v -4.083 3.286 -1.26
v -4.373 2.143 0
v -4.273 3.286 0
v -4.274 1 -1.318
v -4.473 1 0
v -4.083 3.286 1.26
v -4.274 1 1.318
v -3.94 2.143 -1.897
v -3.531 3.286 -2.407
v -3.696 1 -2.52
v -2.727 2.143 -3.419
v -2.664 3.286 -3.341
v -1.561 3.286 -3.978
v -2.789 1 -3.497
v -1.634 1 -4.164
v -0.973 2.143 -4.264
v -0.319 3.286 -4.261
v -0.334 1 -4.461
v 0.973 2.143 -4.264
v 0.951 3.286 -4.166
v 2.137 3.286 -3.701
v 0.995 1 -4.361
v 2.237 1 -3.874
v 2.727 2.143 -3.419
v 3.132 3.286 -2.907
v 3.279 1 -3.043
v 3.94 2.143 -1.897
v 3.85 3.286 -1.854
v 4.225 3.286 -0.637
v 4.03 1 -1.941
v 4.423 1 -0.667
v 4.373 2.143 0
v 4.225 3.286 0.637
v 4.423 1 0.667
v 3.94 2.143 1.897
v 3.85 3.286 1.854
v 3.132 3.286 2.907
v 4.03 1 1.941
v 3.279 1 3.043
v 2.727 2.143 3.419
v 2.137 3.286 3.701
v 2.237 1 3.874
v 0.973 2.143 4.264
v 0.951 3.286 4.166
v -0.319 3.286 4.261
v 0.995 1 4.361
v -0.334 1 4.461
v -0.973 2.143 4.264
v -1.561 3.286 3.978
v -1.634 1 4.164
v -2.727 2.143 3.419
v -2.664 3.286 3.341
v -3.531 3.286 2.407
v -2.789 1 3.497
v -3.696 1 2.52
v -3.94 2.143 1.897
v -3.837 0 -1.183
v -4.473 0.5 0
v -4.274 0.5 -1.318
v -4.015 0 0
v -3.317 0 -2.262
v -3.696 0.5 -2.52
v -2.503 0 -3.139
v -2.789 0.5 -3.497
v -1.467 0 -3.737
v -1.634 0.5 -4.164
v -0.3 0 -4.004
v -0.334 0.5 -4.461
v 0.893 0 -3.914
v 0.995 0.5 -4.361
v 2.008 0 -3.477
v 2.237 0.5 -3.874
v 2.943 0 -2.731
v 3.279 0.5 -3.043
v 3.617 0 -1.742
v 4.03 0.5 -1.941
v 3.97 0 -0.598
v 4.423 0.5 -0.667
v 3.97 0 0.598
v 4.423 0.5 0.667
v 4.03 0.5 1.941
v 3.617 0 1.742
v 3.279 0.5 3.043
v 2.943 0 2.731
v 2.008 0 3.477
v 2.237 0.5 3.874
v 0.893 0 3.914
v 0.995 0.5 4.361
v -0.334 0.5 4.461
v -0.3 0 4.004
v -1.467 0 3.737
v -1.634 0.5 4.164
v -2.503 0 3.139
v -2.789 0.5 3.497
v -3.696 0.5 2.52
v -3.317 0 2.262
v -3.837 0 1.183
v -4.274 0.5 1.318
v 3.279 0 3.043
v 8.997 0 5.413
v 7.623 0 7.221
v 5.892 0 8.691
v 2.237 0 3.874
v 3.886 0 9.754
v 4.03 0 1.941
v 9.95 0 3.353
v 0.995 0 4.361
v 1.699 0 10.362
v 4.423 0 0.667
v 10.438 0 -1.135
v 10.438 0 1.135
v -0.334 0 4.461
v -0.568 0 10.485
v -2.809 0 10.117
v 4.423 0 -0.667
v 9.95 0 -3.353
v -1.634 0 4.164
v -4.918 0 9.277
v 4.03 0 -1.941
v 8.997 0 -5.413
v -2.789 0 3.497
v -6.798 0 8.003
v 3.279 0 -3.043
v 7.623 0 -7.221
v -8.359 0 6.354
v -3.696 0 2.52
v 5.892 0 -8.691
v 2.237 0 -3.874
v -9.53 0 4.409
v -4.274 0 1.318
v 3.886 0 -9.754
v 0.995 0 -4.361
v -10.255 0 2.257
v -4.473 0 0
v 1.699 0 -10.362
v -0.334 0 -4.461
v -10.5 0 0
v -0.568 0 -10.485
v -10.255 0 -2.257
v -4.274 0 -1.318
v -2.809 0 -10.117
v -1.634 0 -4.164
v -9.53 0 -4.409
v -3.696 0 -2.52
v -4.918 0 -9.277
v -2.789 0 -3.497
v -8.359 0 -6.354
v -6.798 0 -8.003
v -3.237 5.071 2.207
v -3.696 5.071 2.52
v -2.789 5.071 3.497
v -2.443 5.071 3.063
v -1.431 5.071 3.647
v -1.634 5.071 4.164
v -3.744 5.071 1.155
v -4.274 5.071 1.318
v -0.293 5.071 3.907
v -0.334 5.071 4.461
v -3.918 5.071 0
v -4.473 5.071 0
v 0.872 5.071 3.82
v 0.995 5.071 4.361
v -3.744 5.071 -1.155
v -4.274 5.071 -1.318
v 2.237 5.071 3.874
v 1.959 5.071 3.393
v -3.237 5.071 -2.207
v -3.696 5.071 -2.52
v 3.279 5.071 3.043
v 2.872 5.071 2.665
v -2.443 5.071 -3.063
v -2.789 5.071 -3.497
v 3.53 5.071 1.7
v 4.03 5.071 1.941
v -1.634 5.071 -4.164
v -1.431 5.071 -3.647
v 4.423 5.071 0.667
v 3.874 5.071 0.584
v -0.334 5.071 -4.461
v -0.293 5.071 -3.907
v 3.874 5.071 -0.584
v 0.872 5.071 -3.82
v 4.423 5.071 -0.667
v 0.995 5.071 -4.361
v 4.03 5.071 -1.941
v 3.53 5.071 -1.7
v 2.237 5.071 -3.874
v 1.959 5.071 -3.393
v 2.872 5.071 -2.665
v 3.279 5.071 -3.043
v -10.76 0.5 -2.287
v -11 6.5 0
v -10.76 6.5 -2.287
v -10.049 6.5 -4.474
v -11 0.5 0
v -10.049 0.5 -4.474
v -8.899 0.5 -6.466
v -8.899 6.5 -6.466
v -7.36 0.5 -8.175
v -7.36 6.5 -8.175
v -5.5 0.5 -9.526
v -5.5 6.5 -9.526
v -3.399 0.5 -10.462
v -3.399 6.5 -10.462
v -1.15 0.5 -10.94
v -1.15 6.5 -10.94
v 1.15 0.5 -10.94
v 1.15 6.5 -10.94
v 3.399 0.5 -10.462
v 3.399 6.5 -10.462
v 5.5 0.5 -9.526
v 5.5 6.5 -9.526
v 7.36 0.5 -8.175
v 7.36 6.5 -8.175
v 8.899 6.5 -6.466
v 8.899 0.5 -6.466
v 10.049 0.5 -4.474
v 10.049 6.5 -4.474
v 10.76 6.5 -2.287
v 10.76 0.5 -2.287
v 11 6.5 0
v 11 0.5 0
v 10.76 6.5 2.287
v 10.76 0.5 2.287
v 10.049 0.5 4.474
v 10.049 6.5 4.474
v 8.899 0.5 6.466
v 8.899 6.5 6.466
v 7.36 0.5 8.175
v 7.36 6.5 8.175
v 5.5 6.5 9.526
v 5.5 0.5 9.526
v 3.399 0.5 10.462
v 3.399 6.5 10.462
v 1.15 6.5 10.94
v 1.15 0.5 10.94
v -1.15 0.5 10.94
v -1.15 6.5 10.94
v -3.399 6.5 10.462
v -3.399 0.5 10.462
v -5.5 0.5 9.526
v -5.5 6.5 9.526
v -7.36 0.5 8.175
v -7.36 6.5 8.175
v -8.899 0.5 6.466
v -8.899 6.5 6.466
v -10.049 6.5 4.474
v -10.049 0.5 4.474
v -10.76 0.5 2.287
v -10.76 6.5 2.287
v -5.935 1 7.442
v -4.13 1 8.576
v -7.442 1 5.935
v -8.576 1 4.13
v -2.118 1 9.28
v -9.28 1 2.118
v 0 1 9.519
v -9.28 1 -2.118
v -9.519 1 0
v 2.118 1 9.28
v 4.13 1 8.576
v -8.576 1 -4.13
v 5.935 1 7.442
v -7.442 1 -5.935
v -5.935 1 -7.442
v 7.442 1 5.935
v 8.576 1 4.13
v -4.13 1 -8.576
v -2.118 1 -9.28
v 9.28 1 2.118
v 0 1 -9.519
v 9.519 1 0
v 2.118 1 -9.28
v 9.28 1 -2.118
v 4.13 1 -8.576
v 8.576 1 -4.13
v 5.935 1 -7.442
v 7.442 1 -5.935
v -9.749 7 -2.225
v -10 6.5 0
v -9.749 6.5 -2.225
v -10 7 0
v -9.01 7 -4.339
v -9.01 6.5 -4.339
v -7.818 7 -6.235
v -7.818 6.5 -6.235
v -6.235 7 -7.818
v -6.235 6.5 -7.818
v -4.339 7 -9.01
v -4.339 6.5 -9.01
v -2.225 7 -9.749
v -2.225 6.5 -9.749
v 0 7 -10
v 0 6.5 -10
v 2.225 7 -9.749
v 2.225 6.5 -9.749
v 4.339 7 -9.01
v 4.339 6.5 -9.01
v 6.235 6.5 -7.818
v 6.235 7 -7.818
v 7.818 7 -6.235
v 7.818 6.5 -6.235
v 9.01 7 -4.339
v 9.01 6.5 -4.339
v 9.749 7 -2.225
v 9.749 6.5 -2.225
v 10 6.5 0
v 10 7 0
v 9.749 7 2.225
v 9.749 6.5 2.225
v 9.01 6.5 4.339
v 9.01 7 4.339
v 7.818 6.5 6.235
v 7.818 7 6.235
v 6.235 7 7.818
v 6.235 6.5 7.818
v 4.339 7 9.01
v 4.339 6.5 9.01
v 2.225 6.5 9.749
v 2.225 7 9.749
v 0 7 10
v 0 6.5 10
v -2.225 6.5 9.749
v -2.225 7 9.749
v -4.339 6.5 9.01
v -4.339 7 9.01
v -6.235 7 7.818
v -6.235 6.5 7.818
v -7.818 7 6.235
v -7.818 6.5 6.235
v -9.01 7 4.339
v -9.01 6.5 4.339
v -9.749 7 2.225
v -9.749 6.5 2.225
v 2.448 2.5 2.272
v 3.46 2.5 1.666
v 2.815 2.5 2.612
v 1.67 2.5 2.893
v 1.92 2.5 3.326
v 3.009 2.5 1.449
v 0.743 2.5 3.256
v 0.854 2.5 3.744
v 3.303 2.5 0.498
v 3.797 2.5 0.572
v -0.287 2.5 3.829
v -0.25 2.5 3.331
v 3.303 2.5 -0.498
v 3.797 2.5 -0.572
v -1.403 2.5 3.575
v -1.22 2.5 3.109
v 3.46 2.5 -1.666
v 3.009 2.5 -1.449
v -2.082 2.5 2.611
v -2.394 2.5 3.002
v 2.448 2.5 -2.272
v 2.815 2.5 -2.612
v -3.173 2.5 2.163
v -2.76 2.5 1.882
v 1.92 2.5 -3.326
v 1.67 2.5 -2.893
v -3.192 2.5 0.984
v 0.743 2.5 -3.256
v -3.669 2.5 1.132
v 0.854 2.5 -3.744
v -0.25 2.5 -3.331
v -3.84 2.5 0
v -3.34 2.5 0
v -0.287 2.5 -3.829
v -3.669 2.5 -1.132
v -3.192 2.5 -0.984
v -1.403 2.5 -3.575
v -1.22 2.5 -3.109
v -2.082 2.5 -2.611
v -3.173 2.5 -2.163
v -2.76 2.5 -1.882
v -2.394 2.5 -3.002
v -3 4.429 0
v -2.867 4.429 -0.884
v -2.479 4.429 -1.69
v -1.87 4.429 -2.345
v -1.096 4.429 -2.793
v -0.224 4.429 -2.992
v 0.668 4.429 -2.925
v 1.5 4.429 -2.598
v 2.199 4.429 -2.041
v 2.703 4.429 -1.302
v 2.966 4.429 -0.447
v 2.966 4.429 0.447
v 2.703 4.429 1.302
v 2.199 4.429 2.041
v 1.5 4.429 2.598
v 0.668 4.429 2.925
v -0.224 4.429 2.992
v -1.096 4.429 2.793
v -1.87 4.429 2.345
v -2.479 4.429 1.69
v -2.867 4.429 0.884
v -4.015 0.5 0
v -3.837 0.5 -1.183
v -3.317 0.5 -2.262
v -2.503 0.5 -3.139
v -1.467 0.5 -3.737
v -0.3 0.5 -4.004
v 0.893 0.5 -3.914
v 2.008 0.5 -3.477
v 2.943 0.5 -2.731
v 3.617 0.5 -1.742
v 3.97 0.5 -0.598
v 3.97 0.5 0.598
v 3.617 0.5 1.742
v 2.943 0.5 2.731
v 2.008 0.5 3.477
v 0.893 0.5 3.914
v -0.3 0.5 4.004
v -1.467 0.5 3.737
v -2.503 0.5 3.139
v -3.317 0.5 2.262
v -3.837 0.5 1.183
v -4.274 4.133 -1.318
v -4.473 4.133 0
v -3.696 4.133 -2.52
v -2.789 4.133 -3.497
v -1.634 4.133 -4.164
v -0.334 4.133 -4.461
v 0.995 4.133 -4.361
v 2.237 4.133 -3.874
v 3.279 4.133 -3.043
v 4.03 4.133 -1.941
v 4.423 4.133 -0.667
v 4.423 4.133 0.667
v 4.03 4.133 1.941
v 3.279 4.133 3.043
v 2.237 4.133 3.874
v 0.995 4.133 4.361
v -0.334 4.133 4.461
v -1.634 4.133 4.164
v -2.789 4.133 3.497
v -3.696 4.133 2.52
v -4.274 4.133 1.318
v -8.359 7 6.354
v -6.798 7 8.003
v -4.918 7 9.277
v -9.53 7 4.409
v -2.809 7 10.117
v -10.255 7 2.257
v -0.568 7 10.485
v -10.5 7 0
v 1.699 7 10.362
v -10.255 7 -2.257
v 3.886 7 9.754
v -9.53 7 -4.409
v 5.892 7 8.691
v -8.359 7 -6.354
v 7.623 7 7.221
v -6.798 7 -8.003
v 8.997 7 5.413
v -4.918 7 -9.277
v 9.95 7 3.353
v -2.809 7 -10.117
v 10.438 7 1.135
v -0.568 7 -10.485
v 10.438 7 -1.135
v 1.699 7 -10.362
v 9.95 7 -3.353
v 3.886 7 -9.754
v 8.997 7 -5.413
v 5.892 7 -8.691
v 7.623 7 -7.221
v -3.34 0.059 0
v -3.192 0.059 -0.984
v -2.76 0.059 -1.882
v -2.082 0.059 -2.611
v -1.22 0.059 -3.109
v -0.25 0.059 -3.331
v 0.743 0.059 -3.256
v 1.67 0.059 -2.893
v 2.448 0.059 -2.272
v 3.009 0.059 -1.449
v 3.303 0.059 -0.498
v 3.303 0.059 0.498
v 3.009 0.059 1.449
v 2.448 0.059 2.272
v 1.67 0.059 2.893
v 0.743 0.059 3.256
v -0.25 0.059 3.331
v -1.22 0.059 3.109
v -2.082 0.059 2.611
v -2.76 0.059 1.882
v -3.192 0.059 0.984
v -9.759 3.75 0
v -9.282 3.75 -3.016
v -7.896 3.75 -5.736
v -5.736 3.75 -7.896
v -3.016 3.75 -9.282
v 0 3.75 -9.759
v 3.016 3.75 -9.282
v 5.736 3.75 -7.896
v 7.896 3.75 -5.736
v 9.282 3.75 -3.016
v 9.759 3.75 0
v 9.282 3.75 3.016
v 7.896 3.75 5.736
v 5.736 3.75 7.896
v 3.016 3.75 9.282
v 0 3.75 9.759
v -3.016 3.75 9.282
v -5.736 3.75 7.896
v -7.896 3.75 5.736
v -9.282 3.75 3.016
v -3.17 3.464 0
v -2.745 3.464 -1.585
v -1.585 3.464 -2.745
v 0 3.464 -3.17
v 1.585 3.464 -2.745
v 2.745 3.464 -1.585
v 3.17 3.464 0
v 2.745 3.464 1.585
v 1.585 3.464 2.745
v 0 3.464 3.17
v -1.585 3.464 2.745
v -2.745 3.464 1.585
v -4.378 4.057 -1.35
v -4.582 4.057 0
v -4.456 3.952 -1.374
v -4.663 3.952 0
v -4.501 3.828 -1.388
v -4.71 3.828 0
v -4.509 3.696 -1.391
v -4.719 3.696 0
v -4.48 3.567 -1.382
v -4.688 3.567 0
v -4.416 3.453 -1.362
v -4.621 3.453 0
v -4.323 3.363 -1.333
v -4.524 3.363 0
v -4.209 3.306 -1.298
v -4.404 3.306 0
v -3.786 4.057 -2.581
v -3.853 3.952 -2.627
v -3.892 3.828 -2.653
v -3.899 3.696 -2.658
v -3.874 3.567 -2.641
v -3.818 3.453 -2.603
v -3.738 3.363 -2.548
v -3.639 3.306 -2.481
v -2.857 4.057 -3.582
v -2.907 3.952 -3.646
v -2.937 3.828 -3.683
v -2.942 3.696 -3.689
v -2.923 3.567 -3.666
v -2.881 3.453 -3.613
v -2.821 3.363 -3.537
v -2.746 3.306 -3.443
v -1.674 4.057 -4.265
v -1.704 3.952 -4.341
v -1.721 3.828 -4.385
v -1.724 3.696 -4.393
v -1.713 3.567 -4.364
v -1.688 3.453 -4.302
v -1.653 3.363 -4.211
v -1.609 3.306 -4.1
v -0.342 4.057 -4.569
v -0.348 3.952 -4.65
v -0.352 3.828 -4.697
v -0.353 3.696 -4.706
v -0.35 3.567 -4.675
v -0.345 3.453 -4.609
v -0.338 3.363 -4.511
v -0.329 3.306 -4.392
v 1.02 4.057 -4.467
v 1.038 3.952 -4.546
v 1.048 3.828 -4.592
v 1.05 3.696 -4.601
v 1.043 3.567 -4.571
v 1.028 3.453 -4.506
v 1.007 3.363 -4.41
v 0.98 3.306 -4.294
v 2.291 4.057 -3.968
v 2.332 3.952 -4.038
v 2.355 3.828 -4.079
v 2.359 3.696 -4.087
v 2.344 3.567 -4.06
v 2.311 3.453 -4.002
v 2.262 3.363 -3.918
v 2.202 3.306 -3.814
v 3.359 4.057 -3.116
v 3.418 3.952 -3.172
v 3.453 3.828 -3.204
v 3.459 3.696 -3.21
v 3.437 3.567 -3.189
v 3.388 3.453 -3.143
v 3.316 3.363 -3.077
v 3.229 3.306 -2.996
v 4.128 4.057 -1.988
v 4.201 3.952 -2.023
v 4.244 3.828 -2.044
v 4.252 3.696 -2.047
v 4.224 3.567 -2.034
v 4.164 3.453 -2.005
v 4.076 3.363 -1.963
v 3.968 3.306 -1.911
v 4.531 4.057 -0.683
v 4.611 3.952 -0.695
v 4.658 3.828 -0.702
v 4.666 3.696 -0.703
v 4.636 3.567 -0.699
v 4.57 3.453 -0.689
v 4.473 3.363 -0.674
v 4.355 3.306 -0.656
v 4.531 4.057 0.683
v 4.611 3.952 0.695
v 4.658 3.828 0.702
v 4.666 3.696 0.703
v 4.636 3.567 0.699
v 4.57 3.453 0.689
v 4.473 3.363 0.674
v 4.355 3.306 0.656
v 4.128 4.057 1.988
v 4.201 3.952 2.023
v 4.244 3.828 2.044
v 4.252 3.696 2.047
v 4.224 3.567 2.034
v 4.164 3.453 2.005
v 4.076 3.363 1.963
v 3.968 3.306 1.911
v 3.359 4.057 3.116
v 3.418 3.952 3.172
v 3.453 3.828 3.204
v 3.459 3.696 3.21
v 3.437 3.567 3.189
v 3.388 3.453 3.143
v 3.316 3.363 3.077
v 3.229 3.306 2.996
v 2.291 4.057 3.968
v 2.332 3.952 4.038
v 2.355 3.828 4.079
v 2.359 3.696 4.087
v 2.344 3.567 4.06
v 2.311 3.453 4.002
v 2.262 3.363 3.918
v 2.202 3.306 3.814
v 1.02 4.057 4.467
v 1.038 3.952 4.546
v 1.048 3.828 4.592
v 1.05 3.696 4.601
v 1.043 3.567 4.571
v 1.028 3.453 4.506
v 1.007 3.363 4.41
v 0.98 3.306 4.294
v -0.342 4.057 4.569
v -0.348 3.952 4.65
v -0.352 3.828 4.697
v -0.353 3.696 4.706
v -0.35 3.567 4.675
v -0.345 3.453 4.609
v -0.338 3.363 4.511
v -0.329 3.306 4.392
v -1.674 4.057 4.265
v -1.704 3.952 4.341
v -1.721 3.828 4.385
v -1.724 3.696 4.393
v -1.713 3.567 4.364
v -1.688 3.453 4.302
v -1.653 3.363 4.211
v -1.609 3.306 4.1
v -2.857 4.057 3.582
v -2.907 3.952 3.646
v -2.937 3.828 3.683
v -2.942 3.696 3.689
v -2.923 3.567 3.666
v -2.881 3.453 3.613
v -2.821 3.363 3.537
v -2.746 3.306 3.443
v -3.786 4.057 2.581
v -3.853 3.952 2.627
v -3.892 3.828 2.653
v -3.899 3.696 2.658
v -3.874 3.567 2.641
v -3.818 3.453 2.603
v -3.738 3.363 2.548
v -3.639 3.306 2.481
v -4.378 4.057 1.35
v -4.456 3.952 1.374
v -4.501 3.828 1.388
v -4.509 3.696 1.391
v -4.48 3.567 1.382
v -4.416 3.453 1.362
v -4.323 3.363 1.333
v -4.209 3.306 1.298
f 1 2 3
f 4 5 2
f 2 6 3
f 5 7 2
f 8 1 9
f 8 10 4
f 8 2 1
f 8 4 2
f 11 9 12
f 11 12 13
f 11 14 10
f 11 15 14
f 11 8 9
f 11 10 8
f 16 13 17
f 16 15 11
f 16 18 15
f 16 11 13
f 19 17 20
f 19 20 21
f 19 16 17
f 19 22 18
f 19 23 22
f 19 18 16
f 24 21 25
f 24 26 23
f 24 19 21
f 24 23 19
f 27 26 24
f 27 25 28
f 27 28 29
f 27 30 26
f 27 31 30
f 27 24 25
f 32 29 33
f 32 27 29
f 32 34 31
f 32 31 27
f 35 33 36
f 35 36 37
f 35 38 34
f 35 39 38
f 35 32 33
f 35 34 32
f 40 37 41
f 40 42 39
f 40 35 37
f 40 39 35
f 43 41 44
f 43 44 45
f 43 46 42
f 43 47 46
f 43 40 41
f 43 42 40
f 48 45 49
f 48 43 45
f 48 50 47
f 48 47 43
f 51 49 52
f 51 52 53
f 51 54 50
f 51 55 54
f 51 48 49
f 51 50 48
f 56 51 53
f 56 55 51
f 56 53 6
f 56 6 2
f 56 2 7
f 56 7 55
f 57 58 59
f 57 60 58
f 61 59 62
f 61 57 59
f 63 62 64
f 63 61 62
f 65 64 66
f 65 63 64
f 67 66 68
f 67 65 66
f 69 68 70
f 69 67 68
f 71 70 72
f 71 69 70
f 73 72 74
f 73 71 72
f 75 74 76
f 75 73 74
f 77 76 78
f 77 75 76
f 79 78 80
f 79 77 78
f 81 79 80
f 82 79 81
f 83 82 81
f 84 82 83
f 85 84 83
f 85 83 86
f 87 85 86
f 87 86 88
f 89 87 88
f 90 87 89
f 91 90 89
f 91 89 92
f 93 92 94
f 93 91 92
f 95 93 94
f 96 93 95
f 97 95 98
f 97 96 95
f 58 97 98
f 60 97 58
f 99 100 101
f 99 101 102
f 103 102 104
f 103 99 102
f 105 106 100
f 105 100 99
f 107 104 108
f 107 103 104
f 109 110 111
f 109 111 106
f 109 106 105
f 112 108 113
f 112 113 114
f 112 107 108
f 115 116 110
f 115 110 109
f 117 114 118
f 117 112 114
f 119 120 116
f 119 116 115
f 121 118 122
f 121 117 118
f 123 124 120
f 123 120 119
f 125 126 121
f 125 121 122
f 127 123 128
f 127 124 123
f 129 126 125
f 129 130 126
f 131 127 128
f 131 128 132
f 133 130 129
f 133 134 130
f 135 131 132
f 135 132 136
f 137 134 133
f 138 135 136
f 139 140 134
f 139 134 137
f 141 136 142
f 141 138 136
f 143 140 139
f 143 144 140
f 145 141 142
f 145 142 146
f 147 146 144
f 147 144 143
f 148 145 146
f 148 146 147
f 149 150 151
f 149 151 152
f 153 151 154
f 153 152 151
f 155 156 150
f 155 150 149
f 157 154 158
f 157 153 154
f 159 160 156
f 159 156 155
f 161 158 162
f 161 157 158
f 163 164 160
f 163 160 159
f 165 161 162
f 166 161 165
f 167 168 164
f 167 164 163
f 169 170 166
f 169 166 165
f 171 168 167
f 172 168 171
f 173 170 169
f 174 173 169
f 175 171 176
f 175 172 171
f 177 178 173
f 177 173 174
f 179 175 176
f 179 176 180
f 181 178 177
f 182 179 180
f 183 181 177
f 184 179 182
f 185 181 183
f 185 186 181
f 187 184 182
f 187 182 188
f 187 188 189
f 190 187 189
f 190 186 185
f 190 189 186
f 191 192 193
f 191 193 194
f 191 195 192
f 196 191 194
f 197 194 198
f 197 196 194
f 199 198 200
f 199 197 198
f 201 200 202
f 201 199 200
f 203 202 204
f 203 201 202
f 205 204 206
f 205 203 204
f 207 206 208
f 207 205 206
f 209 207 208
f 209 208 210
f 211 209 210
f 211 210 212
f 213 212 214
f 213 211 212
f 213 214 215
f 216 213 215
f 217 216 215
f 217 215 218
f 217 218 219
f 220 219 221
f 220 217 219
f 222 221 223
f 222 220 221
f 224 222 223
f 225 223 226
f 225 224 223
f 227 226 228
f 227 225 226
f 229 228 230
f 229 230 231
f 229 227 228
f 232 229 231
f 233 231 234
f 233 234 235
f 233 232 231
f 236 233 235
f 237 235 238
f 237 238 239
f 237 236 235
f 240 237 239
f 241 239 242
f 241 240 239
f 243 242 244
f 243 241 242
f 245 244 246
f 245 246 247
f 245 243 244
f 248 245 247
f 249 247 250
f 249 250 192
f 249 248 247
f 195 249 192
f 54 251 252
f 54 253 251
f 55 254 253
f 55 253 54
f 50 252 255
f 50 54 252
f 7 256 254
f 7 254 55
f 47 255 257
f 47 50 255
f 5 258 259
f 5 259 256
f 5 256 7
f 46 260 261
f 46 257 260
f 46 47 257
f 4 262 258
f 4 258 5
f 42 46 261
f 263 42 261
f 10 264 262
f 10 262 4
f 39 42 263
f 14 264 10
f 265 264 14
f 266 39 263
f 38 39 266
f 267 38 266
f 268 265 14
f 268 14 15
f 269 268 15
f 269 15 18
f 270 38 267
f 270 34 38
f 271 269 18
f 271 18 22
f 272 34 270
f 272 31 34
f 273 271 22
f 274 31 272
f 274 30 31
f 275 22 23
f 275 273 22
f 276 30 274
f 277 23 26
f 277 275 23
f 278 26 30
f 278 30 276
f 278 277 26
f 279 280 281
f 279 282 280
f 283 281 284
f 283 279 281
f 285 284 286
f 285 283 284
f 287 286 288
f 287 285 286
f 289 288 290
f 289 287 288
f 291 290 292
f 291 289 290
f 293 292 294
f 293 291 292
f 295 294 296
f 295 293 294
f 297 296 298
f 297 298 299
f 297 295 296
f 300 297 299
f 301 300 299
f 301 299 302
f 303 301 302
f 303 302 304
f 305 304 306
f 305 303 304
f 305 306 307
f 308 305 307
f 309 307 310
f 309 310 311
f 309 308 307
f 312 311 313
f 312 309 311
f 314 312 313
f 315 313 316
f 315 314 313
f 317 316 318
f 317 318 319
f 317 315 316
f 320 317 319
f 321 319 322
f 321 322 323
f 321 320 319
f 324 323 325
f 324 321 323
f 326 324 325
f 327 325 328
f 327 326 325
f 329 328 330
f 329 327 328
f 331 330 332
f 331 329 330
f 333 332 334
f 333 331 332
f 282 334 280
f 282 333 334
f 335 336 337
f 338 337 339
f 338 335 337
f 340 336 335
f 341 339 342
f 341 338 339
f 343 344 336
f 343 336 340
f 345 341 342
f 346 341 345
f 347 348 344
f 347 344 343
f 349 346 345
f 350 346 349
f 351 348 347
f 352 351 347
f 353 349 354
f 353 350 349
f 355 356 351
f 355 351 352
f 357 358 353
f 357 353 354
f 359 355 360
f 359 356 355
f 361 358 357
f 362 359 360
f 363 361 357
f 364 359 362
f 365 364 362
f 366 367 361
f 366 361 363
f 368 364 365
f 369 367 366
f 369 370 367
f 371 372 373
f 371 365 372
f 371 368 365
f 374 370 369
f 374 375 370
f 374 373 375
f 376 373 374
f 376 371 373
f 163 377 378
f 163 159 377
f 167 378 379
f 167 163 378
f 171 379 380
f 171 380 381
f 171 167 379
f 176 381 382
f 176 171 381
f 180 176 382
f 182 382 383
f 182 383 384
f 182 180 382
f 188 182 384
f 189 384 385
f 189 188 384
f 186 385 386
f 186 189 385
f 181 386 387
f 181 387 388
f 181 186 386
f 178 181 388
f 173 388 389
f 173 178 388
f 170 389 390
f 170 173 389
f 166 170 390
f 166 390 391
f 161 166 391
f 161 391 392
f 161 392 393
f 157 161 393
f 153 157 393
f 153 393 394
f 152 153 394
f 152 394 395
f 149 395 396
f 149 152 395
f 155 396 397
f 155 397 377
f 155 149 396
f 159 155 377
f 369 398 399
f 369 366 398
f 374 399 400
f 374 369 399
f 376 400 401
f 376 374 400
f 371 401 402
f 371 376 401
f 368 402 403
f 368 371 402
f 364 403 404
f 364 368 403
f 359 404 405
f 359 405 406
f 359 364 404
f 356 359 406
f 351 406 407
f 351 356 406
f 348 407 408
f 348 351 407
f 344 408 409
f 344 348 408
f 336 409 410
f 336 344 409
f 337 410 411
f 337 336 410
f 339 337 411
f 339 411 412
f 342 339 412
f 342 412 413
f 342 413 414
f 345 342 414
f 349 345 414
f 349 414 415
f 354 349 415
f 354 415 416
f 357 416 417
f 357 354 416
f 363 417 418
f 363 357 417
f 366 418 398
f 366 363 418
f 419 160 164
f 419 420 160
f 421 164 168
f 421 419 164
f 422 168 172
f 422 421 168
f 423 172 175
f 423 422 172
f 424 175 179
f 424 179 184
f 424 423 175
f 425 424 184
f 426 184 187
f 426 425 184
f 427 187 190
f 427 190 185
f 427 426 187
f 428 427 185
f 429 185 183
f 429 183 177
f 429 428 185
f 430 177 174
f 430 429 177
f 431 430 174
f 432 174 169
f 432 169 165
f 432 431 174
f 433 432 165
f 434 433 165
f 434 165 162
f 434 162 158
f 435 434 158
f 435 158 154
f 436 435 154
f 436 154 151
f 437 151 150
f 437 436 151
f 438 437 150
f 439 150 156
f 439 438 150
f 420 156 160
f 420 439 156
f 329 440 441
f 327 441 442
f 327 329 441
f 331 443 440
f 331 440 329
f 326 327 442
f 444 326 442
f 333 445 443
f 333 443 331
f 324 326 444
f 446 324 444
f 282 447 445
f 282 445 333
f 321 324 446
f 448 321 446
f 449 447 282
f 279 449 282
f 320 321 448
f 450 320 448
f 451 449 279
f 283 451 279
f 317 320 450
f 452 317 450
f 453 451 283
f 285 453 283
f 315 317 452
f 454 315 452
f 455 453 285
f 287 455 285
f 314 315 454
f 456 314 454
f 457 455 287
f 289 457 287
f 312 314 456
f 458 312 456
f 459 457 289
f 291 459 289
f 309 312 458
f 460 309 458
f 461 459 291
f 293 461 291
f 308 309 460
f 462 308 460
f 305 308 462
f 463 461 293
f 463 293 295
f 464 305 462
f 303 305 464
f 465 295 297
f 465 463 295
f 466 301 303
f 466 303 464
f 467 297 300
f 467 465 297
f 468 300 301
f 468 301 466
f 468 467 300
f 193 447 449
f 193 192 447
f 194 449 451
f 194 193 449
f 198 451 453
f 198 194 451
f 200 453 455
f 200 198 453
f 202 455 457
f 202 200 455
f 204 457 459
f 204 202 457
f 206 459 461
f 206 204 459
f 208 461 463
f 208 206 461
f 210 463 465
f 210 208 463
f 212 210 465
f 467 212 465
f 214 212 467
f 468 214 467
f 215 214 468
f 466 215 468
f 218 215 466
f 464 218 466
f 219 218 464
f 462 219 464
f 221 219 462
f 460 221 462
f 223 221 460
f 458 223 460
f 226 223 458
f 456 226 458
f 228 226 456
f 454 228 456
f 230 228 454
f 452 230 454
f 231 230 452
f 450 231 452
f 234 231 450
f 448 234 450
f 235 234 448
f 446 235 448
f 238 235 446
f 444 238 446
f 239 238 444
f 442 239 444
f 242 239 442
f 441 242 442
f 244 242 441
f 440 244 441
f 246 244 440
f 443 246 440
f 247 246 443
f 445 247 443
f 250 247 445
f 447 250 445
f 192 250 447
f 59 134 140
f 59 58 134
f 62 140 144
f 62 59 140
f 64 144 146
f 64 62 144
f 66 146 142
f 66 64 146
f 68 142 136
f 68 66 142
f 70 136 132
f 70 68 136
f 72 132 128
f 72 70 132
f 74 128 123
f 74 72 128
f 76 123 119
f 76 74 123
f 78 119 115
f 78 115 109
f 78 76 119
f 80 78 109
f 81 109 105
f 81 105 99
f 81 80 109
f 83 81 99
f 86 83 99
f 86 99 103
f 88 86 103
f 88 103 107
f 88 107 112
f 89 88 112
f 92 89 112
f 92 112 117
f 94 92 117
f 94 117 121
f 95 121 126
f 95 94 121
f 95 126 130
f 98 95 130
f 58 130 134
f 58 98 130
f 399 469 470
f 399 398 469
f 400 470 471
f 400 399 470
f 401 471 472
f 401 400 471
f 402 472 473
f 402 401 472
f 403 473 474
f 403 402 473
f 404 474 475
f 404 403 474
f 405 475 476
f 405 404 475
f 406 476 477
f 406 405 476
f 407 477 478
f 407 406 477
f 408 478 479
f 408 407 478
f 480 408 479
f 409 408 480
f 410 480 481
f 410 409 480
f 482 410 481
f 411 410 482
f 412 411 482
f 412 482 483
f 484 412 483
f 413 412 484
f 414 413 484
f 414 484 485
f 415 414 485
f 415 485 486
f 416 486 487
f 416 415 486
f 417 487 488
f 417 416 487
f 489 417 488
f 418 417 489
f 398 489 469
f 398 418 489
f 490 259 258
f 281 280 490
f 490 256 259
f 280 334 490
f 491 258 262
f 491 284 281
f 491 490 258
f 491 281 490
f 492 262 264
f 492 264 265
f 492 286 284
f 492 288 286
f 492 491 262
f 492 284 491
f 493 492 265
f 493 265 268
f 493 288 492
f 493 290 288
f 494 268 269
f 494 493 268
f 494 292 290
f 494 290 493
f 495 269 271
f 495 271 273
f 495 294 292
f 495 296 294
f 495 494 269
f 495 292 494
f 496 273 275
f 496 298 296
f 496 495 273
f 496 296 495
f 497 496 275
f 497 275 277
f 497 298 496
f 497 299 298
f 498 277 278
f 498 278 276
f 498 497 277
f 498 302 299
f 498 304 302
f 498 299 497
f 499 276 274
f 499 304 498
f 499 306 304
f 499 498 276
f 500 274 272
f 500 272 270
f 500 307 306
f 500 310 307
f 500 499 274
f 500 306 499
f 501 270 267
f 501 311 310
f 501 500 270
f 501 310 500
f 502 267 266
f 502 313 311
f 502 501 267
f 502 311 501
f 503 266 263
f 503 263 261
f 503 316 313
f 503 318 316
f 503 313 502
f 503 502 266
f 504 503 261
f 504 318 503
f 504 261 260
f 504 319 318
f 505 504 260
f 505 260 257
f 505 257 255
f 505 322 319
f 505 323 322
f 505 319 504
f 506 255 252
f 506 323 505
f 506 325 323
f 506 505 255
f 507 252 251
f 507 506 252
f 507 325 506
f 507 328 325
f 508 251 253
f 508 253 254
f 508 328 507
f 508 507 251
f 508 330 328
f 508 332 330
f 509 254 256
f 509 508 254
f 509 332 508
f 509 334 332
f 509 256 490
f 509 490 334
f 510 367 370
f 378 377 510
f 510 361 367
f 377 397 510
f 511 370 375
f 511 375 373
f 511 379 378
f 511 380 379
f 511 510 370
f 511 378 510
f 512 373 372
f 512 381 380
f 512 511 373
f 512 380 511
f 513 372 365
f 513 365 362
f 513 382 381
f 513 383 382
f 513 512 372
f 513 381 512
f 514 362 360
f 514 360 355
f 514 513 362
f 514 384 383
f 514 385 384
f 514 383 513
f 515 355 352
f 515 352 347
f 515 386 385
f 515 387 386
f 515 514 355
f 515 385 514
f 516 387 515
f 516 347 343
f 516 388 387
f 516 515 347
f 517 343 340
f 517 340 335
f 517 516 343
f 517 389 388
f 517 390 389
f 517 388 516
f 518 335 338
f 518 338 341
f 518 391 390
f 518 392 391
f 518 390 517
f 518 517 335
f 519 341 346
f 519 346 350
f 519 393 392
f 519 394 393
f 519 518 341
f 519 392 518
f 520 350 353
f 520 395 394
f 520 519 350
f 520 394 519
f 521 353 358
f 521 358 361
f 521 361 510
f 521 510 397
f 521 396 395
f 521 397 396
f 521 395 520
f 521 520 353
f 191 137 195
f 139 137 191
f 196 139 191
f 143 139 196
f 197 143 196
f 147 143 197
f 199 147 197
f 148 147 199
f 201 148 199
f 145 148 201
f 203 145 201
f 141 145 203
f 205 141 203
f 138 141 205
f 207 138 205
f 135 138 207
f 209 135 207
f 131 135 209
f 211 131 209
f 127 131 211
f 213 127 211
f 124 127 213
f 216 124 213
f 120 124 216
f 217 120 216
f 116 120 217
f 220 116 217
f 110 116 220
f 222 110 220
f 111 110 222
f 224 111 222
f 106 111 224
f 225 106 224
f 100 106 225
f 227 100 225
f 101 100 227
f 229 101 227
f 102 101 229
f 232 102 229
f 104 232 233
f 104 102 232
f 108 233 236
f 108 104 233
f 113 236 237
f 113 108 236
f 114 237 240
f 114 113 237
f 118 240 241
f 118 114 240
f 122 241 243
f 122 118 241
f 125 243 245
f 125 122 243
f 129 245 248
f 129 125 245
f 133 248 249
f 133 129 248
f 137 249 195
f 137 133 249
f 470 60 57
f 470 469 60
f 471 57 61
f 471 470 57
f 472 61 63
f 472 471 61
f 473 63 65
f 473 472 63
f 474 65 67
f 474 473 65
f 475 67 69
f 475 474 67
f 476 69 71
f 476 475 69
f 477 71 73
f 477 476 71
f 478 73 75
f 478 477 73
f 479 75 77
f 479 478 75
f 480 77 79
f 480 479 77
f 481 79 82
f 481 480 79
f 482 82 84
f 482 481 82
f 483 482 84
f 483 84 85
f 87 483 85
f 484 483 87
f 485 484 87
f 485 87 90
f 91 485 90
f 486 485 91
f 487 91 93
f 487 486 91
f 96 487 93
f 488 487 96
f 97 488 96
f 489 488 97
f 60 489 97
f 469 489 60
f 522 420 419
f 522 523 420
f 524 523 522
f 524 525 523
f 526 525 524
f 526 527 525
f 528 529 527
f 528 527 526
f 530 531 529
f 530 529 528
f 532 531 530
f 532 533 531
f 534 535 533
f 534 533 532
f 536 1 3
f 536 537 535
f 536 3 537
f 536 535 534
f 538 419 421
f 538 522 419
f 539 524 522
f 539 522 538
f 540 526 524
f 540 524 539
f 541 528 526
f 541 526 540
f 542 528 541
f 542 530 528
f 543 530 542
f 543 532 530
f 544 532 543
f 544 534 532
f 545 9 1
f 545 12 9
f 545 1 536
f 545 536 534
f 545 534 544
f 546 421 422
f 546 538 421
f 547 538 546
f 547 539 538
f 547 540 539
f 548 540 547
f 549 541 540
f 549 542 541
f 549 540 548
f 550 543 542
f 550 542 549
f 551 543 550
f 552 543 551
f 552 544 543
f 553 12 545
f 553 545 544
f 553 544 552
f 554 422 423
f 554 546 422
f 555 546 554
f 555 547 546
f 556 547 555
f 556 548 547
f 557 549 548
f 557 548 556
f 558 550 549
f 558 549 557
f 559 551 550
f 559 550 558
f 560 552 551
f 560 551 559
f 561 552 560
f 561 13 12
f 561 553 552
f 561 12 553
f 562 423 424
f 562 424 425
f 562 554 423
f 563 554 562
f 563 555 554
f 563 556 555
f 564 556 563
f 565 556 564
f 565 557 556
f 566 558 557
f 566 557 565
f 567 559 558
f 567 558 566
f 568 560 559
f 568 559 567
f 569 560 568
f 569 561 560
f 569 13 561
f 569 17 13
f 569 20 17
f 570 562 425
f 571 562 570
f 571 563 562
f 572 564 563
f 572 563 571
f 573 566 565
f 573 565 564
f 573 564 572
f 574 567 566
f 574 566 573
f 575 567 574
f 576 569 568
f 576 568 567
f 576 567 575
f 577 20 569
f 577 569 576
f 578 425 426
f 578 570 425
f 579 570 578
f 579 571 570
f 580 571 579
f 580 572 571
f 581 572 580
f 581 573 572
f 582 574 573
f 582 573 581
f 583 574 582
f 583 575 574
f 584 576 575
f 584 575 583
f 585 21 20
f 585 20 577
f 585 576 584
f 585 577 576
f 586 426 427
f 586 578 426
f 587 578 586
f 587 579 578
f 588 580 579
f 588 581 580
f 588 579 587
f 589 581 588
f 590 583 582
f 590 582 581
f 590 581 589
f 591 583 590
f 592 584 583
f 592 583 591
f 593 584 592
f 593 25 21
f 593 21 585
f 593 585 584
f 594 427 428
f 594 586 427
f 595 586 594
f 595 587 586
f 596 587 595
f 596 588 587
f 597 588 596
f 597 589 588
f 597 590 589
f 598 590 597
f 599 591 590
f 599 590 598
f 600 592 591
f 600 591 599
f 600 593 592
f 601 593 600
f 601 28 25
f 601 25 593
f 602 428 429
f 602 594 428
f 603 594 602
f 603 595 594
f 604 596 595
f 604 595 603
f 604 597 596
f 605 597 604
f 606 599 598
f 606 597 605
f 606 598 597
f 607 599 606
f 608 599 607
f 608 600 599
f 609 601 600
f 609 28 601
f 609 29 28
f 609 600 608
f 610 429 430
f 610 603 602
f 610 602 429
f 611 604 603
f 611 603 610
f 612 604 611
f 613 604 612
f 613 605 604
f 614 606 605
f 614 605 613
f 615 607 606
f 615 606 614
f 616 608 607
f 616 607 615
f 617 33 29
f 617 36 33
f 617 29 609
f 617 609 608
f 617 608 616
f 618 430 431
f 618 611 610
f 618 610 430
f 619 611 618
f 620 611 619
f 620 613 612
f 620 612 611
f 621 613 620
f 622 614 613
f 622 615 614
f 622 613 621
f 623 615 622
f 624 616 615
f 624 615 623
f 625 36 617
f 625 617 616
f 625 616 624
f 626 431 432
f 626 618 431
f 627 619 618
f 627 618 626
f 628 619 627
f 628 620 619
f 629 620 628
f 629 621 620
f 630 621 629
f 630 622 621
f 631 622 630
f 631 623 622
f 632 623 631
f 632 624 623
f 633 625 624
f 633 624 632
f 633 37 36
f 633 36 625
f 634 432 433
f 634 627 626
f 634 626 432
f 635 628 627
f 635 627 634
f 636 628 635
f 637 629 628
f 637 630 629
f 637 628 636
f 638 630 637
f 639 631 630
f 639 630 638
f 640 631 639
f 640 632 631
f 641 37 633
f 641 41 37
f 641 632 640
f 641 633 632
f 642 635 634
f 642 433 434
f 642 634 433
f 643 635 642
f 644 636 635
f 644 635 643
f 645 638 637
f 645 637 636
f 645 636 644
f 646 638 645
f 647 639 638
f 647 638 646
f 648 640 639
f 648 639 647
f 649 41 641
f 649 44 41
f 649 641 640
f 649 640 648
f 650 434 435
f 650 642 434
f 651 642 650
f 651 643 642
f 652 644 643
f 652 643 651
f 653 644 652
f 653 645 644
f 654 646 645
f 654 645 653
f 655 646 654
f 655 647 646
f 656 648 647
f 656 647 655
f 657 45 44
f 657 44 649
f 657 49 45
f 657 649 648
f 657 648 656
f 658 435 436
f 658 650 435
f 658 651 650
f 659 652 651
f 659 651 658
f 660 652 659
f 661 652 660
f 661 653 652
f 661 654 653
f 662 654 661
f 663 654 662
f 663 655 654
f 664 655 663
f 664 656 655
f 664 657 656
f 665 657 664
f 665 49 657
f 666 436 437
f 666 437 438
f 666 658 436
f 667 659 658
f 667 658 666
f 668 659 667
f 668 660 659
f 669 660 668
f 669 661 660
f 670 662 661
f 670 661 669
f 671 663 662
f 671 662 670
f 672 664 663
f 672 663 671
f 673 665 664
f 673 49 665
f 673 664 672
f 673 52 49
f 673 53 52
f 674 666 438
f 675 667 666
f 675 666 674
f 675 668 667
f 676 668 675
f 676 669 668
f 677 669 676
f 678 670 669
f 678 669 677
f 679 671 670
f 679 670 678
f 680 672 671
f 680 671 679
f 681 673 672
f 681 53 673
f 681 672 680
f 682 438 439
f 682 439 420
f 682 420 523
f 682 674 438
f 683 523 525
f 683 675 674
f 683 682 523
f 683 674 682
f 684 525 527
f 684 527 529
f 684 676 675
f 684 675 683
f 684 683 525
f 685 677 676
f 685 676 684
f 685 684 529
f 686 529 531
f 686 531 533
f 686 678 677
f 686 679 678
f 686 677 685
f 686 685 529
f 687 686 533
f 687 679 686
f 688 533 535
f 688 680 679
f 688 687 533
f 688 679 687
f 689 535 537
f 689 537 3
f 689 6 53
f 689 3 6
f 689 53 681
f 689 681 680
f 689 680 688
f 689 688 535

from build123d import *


with BuildPart() as part:
    # 草图1 → 旋转1 (revolve)
    with BuildSketch(Plane.XY):
        with BuildLine():
            Line((-10.5, 0), (-4.473202091, 0))
            Line((-4.473202091, 0), (-4.473202091, 0.5))
            Line((-4.473202091, 0.5), (-4.015036504, 0))
            Line((-4.015036504, 0), (-3.340059177, 0.059052864))
            Line((-3.340059177, 0.059052864), (-4.015036504, 0.5))
            Line((-4.015036504, 0.5), (-3.840059177, 2.5))
            Line((-3.840059177, 2.5), (-3.340059177, 2.5))
            Line((-3.340059177, 2.5), (-3, 4.428571429))
            Line((-3, 4.428571429), (-3.918095147, 5.071428571))
            Line((-3.918095147, 5.071428571), (-4.473202091, 5.071428571))
            Line((-4.473202091, 5.071428571), (-4.473202091, 4.133224056))
            ThreePointArc((-4.473202091, 4.133224056), (-4.708452271, 3.630475426), (-4.273202091, 3.286010461))
            Line((-4.273202091, 3.286010461), (-4.473202091, 1))
            Line((-4.473202091, 1), (-9.518812351, 1))
            Line((-9.518812351, 1), (-10, 6.5))
            Line((-10, 6.5), (-10, 7))
            Line((-10, 7), (-10.5, 7))
            Line((-10.5, 7), (-11, 6.5))
            Line((-11, 6.5), (-11, 0.5))
            Line((-11, 0.5), (-10.5, 0))
        make_face()
    revolve(axis=Axis((0, 5.977335763, 0), (0, -1, 0)))


solid = part.part
